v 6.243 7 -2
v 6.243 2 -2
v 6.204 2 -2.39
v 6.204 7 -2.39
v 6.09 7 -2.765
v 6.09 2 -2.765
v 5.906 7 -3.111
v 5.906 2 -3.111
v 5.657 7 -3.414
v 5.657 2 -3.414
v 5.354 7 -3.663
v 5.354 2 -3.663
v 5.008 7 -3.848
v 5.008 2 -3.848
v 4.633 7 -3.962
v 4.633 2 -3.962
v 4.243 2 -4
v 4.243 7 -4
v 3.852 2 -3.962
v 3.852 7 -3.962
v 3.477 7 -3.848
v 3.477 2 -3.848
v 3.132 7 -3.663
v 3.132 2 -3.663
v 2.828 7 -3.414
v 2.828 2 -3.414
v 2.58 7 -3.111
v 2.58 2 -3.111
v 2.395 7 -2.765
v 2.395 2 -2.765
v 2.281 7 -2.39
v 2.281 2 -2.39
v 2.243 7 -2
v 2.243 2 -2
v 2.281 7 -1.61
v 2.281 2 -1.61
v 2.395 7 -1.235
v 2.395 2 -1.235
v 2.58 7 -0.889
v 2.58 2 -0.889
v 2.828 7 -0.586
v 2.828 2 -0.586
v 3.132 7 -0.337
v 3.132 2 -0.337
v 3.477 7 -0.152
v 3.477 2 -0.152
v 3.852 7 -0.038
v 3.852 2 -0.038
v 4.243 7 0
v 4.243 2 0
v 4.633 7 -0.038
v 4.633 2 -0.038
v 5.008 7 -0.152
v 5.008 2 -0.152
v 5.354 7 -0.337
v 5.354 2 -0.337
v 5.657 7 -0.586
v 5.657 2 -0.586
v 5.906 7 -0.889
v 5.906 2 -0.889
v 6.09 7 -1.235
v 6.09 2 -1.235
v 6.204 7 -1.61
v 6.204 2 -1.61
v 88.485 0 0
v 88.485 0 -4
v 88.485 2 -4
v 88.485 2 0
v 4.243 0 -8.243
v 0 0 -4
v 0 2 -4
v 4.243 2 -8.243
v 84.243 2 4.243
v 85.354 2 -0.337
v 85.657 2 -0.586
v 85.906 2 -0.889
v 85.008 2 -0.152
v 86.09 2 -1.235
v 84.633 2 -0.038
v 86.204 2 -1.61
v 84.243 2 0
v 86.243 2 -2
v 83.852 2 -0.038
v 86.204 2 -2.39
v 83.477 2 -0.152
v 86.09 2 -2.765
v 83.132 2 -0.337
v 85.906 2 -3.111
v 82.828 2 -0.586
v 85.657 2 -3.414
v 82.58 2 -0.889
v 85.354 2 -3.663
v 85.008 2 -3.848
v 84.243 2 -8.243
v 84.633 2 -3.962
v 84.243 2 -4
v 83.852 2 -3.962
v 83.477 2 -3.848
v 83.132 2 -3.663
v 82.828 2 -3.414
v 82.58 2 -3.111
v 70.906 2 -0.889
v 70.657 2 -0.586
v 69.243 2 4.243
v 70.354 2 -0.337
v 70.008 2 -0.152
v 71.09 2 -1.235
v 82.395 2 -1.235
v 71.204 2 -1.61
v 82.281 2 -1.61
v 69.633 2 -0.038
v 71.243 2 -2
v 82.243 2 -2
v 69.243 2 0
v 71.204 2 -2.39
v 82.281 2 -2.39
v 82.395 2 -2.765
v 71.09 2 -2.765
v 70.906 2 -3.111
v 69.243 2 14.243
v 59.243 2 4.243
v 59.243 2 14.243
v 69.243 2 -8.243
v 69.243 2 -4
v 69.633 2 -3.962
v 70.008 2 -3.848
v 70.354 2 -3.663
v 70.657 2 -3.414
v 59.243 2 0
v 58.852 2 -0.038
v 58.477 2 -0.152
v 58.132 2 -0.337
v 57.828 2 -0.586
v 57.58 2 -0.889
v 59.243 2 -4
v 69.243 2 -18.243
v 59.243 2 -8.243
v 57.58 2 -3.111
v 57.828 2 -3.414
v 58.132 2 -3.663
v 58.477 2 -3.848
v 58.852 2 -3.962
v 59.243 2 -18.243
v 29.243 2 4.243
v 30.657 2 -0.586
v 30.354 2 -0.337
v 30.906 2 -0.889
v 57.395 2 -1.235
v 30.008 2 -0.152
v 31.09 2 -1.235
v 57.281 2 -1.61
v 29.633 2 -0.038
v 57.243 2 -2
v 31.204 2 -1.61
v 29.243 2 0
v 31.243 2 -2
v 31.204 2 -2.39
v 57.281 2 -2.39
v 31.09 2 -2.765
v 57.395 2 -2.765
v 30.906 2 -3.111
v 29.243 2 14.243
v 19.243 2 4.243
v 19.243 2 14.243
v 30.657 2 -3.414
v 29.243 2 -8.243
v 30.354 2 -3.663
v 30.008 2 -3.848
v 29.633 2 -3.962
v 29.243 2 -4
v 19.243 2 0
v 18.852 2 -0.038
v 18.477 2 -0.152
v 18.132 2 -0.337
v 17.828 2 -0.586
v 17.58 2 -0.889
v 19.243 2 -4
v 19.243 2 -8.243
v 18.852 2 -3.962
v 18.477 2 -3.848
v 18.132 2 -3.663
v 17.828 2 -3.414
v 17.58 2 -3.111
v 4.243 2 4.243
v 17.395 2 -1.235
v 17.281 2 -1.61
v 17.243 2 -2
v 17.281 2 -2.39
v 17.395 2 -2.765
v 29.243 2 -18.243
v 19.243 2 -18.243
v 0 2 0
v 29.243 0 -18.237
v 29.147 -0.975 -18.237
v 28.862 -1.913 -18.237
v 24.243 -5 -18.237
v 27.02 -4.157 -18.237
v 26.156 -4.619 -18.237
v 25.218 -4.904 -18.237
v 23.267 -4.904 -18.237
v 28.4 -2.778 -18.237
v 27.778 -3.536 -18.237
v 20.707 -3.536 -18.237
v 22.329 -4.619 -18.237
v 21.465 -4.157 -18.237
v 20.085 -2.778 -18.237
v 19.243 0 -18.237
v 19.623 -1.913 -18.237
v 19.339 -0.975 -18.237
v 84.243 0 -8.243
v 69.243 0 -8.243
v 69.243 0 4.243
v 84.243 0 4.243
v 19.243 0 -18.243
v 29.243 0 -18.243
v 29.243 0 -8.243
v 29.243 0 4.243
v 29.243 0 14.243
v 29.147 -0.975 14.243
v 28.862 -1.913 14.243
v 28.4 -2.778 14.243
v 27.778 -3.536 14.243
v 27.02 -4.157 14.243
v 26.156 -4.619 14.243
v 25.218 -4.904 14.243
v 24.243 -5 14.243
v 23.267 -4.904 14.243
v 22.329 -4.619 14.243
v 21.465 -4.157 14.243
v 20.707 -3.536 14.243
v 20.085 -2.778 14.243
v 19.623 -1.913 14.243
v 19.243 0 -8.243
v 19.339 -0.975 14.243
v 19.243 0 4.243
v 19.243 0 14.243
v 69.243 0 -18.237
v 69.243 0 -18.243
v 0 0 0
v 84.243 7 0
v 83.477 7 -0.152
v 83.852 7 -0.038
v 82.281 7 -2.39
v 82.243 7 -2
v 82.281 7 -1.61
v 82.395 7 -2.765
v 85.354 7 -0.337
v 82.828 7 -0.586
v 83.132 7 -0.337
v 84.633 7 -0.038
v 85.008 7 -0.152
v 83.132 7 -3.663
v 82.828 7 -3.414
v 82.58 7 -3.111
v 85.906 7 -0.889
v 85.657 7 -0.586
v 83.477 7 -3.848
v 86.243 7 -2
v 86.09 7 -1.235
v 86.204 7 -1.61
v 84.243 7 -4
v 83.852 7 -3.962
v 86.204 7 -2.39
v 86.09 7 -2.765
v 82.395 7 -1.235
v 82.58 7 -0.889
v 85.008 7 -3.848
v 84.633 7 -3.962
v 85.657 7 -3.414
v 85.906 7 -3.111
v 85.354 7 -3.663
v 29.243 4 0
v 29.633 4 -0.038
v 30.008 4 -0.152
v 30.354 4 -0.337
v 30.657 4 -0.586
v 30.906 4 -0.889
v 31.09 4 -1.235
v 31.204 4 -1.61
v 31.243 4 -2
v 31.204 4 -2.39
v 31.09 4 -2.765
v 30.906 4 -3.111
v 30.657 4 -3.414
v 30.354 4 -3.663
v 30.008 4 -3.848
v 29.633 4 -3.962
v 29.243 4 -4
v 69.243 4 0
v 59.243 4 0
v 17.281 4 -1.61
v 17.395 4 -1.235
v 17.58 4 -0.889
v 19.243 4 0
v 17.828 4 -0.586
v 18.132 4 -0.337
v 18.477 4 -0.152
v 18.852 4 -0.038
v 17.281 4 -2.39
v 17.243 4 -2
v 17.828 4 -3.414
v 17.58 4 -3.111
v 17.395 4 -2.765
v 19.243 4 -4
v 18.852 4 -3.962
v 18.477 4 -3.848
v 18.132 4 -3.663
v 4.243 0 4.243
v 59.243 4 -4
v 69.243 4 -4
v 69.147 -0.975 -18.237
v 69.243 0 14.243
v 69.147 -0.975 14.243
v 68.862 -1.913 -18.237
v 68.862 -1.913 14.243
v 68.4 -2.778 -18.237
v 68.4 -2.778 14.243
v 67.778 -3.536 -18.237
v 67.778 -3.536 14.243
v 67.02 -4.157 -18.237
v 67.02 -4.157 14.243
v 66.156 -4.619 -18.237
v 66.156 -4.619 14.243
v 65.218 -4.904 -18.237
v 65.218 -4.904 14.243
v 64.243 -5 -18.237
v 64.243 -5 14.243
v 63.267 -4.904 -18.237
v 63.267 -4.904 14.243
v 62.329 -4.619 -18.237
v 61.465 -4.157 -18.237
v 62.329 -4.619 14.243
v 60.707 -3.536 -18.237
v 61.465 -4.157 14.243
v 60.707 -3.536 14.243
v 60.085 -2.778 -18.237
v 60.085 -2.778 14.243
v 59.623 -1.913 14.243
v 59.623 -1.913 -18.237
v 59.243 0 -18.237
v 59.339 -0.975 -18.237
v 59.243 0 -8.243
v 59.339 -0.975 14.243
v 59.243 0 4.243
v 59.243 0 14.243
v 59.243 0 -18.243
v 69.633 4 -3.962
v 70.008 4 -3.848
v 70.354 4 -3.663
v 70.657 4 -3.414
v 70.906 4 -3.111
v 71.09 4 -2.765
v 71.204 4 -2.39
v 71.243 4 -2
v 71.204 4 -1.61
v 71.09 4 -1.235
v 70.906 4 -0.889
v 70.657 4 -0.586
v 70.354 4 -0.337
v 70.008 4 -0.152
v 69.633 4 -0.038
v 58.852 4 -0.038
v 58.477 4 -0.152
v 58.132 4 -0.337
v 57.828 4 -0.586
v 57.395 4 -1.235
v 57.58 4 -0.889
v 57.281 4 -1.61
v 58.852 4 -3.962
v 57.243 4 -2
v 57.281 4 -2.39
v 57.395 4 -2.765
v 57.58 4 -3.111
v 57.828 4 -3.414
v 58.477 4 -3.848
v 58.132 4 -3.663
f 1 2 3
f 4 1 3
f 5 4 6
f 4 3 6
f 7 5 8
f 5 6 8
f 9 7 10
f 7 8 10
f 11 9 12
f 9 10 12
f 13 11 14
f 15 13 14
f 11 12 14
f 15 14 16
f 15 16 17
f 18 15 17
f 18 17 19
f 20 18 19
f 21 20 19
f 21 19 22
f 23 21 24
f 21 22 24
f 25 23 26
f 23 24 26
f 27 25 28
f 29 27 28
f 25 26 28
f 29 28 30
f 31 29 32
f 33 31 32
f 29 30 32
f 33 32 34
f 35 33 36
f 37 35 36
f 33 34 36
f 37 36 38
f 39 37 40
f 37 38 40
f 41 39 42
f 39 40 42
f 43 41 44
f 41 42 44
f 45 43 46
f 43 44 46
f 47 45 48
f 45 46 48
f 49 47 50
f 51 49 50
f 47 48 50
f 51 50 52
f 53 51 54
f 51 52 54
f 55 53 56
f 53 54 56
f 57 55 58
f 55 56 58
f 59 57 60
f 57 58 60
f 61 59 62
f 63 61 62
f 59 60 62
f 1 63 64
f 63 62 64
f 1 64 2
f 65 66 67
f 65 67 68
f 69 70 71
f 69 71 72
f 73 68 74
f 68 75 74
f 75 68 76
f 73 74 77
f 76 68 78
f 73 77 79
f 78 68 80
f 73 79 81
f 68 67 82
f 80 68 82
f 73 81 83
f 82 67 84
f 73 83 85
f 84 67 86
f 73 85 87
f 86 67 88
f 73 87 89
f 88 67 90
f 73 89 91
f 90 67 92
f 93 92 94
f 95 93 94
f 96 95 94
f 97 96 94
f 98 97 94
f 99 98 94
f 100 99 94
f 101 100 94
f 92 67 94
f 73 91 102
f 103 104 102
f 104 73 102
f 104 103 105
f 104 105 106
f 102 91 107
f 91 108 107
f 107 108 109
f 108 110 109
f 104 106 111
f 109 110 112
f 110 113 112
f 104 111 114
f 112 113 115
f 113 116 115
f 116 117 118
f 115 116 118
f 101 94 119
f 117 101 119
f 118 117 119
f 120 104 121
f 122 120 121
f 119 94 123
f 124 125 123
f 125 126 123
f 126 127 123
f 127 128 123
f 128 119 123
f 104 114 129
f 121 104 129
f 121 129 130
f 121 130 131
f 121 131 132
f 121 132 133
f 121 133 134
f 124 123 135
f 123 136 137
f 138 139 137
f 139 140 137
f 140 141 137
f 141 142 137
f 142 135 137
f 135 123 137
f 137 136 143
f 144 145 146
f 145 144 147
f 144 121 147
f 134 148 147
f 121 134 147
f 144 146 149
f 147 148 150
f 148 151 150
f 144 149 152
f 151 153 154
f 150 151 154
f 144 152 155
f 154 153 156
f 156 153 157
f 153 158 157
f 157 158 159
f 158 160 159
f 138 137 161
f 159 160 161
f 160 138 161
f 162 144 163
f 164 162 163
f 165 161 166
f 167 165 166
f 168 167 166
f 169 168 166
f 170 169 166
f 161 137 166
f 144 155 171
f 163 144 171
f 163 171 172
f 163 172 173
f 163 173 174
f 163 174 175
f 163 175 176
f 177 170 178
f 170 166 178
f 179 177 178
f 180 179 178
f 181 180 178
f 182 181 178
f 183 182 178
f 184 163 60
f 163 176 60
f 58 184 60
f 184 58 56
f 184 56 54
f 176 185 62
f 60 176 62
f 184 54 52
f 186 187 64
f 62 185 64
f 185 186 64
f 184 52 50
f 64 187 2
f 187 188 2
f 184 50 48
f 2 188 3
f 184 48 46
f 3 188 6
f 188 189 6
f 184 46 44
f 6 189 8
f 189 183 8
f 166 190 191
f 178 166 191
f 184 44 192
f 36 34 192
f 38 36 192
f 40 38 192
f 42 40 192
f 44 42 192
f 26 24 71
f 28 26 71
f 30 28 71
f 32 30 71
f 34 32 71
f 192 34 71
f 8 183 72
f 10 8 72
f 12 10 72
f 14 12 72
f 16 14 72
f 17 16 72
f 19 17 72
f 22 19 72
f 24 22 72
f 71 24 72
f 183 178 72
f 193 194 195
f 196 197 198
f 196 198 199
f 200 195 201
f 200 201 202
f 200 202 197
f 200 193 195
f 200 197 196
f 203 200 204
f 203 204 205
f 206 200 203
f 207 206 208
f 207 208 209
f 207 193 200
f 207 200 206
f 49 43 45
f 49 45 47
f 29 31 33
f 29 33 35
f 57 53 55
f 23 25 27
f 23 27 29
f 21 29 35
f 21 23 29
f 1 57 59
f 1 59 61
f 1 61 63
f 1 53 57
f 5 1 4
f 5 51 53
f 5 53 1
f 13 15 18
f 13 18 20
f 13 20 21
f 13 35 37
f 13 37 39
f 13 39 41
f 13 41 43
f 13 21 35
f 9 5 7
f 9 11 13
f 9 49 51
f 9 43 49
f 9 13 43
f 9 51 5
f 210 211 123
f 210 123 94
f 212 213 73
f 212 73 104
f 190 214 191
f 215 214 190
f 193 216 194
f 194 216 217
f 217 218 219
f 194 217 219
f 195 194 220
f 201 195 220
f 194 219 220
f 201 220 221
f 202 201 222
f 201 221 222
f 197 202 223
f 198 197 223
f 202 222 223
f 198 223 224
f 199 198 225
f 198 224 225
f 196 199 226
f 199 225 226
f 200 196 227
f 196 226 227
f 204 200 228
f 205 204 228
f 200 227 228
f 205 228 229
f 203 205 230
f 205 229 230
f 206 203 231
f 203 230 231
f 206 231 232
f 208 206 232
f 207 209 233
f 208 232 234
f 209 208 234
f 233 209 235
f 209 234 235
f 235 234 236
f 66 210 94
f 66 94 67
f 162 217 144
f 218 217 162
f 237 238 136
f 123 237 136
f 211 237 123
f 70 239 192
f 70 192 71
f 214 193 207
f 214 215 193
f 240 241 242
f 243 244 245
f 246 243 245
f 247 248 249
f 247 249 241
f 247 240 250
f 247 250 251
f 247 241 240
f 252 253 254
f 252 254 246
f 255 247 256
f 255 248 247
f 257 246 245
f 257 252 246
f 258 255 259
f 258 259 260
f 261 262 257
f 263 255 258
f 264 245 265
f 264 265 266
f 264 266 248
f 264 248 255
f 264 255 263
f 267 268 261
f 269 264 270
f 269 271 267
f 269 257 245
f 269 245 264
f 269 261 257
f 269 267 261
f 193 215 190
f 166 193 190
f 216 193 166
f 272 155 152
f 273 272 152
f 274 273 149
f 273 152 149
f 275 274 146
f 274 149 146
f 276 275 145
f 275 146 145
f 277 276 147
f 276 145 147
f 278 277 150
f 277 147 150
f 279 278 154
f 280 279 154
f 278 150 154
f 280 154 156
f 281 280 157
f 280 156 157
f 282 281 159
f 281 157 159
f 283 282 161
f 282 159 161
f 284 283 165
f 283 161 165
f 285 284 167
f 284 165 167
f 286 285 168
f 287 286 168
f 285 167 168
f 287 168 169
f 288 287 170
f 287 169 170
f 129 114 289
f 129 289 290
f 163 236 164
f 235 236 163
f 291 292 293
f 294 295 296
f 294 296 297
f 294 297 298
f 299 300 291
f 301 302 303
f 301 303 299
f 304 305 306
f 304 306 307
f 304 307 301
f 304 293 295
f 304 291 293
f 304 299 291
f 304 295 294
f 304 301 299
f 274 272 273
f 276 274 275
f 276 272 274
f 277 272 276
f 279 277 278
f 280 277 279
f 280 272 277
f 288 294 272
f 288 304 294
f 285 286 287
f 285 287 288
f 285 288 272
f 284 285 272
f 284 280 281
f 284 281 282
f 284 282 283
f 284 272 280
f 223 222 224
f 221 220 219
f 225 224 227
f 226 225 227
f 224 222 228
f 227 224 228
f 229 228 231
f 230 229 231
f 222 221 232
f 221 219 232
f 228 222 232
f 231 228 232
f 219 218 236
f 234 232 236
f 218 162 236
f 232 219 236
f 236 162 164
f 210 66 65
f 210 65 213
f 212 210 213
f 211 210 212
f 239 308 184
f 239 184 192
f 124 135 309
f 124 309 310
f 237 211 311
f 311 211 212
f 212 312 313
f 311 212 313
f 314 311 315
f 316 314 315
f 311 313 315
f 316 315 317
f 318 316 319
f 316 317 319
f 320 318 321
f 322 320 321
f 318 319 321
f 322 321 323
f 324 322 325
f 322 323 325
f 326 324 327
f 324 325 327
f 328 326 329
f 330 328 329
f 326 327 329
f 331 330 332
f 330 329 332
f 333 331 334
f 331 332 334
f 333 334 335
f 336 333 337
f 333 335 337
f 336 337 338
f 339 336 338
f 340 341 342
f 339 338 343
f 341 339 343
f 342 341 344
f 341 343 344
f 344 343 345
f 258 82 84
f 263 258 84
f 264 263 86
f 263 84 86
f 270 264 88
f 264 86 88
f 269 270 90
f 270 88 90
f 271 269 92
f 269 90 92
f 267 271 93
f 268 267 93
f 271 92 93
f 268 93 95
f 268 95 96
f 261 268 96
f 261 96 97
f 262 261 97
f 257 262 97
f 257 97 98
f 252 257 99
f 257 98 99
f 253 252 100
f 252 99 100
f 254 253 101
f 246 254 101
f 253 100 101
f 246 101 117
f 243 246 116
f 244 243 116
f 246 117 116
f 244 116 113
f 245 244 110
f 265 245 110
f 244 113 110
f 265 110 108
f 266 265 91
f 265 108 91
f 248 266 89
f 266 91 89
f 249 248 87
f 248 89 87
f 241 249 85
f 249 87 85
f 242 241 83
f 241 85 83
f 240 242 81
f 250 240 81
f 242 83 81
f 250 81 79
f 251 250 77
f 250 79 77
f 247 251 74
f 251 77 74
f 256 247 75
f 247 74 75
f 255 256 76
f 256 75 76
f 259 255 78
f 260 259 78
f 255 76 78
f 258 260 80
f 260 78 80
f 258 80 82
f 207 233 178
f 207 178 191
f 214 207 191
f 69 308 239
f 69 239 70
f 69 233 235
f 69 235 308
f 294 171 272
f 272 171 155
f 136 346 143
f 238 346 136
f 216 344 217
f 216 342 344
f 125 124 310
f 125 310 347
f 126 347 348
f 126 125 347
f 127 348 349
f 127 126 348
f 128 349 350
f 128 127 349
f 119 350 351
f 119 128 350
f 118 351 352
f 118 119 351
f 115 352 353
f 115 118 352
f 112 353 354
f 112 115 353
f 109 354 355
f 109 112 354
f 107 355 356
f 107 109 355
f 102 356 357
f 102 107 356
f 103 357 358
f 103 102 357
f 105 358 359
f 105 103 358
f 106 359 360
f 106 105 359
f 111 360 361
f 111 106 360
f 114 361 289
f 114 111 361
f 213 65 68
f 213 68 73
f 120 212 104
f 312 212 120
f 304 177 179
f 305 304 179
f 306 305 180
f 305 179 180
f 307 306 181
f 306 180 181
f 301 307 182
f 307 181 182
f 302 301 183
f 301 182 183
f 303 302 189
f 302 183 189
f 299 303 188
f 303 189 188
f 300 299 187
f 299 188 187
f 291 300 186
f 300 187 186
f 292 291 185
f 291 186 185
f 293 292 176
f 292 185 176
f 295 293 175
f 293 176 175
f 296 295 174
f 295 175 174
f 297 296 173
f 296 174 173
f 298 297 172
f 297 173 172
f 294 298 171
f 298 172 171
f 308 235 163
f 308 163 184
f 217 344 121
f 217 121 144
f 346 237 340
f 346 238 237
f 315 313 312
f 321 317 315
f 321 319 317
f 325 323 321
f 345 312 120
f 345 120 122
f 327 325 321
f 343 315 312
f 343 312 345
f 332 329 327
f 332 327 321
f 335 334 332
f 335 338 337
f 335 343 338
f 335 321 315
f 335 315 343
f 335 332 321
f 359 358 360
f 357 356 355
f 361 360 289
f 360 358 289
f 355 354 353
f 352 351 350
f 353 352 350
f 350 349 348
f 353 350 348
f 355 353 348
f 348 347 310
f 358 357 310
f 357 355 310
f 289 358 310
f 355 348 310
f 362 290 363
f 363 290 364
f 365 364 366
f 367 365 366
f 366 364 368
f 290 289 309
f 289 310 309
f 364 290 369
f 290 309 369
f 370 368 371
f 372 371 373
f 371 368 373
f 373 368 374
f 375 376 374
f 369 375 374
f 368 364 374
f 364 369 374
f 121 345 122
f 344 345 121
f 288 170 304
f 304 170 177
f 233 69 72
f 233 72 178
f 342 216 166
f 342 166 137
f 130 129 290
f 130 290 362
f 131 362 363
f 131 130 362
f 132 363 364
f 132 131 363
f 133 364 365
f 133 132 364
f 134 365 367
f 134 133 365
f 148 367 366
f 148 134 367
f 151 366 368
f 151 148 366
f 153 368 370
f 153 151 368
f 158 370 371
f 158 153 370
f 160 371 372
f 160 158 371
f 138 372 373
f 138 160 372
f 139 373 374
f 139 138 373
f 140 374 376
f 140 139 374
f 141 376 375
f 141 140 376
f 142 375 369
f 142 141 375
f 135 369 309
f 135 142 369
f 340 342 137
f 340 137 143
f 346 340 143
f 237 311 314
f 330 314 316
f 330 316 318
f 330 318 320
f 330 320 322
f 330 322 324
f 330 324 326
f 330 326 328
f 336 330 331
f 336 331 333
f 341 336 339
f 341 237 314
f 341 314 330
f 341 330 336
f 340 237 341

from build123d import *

# Parameters (mm, degrees)
SALIENTE_EXTRUIR1_DEPTH = 2
SALIENTE_EXTRUIR3_DEPTH = 2
CROQUIS3_R              = 2
SALIENTE_EXTRUIR4_DEPTH = 5
SALIENTE_EXTRUIR5_DEPTH = 32.48


with BuildPart() as part:
    # Croquis1 → Saliente-Extruir1 (new body)
    with BuildSketch(Plane(origin=(0, 0, 0), x_dir=(1, 0, 0), z_dir=(0, 1, 0))):
        Polygon((0, 0), (0, 4), (4.242640687, 8.242640687), (19.242640687, 8.242640687), (19.242640687, 18.242640687), (29.242640687, 18.242640687), (29.242640687, 8.242640687), (59.242640687, 8.242640687), (59.242640687, 18.242640687), (69.242640687, 18.242640687), (69.242640687, 8.242640687), (84.242640687, 8.242640687), (88.485281374, 4), (88.485281374, 0), (84.242640687, -4.242640687), (69.242640687, -4.242640687), (69.242640687, -14.242640687), (59.242640687, -14.242640687), (59.242640687, -4.242640687), (29.242640687, -4.242640687), (29.242640687, -14.242640687), (19.242640687, -14.242640687), (19.242640687, -4.242640687), (4.242640687, -4.242640687), align=None)
    extrude(amount=SALIENTE_EXTRUIR1_DEPTH)

    # Croquis2 → Saliente-Extruir3 (add)
    with BuildSketch(Plane(origin=(0, 2, 0), x_dir=(1, 0, 0), z_dir=(0, 1, 0))):
        with BuildLine():
            ThreePointArc((59.242640745, 0), (57.242640745, 2), (59.242640745, 4))
            Line((59.242640745, 4), (69.242640687, 4))
            ThreePointArc((69.242640687, 4), (71.242640687, 2), (69.242640687, 0))
            Line((69.242640687, 0), (59.242640745, 0))
        make_face()
        with BuildLine():
            Line((19.242640687, 0), (29.242640687, 0))
            ThreePointArc((29.242640687, 0), (31.242640629, 2), (29.242640687, 4))
            Line((29.242640687, 4), (19.242640687, 4))
            ThreePointArc((19.242640687, 4), (17.242640687, 2), (19.242640687, 0))
        make_face()
    extrude(amount=SALIENTE_EXTRUIR3_DEPTH)

    # Croquis3 → Saliente-Extruir4 (add)
    with BuildSketch(Plane(origin=(0, 2, 0), x_dir=(1, 0, 0), z_dir=(0, 1, 0))):
        with Locations((84.242640687, 2)):
            Circle(CROQUIS3_R)
        with Locations((4.242640687, 2)):
            Circle(CROQUIS3_R)
    extrude(amount=SALIENTE_EXTRUIR4_DEPTH)

    # Croquis4 → Saliente-Extruir5 (add)
    with BuildSketch(Plane.XY.offset(14.242640687)):
        with BuildLine():
            Line((19.242640687, 0), (29.242640687, 0))
            ThreePointArc((29.242640687, 0), (24.242640687, -5), (19.242640687, 0))
        make_face()
        with BuildLine():
            Line((59.242640687, 0), (69.242640687, 0))
            ThreePointArc((69.242640687, 0), (64.242640687, -5), (59.242640687, 0))
        make_face()
    extrude(amount=-SALIENTE_EXTRUIR5_DEPTH)


solid = part.part
